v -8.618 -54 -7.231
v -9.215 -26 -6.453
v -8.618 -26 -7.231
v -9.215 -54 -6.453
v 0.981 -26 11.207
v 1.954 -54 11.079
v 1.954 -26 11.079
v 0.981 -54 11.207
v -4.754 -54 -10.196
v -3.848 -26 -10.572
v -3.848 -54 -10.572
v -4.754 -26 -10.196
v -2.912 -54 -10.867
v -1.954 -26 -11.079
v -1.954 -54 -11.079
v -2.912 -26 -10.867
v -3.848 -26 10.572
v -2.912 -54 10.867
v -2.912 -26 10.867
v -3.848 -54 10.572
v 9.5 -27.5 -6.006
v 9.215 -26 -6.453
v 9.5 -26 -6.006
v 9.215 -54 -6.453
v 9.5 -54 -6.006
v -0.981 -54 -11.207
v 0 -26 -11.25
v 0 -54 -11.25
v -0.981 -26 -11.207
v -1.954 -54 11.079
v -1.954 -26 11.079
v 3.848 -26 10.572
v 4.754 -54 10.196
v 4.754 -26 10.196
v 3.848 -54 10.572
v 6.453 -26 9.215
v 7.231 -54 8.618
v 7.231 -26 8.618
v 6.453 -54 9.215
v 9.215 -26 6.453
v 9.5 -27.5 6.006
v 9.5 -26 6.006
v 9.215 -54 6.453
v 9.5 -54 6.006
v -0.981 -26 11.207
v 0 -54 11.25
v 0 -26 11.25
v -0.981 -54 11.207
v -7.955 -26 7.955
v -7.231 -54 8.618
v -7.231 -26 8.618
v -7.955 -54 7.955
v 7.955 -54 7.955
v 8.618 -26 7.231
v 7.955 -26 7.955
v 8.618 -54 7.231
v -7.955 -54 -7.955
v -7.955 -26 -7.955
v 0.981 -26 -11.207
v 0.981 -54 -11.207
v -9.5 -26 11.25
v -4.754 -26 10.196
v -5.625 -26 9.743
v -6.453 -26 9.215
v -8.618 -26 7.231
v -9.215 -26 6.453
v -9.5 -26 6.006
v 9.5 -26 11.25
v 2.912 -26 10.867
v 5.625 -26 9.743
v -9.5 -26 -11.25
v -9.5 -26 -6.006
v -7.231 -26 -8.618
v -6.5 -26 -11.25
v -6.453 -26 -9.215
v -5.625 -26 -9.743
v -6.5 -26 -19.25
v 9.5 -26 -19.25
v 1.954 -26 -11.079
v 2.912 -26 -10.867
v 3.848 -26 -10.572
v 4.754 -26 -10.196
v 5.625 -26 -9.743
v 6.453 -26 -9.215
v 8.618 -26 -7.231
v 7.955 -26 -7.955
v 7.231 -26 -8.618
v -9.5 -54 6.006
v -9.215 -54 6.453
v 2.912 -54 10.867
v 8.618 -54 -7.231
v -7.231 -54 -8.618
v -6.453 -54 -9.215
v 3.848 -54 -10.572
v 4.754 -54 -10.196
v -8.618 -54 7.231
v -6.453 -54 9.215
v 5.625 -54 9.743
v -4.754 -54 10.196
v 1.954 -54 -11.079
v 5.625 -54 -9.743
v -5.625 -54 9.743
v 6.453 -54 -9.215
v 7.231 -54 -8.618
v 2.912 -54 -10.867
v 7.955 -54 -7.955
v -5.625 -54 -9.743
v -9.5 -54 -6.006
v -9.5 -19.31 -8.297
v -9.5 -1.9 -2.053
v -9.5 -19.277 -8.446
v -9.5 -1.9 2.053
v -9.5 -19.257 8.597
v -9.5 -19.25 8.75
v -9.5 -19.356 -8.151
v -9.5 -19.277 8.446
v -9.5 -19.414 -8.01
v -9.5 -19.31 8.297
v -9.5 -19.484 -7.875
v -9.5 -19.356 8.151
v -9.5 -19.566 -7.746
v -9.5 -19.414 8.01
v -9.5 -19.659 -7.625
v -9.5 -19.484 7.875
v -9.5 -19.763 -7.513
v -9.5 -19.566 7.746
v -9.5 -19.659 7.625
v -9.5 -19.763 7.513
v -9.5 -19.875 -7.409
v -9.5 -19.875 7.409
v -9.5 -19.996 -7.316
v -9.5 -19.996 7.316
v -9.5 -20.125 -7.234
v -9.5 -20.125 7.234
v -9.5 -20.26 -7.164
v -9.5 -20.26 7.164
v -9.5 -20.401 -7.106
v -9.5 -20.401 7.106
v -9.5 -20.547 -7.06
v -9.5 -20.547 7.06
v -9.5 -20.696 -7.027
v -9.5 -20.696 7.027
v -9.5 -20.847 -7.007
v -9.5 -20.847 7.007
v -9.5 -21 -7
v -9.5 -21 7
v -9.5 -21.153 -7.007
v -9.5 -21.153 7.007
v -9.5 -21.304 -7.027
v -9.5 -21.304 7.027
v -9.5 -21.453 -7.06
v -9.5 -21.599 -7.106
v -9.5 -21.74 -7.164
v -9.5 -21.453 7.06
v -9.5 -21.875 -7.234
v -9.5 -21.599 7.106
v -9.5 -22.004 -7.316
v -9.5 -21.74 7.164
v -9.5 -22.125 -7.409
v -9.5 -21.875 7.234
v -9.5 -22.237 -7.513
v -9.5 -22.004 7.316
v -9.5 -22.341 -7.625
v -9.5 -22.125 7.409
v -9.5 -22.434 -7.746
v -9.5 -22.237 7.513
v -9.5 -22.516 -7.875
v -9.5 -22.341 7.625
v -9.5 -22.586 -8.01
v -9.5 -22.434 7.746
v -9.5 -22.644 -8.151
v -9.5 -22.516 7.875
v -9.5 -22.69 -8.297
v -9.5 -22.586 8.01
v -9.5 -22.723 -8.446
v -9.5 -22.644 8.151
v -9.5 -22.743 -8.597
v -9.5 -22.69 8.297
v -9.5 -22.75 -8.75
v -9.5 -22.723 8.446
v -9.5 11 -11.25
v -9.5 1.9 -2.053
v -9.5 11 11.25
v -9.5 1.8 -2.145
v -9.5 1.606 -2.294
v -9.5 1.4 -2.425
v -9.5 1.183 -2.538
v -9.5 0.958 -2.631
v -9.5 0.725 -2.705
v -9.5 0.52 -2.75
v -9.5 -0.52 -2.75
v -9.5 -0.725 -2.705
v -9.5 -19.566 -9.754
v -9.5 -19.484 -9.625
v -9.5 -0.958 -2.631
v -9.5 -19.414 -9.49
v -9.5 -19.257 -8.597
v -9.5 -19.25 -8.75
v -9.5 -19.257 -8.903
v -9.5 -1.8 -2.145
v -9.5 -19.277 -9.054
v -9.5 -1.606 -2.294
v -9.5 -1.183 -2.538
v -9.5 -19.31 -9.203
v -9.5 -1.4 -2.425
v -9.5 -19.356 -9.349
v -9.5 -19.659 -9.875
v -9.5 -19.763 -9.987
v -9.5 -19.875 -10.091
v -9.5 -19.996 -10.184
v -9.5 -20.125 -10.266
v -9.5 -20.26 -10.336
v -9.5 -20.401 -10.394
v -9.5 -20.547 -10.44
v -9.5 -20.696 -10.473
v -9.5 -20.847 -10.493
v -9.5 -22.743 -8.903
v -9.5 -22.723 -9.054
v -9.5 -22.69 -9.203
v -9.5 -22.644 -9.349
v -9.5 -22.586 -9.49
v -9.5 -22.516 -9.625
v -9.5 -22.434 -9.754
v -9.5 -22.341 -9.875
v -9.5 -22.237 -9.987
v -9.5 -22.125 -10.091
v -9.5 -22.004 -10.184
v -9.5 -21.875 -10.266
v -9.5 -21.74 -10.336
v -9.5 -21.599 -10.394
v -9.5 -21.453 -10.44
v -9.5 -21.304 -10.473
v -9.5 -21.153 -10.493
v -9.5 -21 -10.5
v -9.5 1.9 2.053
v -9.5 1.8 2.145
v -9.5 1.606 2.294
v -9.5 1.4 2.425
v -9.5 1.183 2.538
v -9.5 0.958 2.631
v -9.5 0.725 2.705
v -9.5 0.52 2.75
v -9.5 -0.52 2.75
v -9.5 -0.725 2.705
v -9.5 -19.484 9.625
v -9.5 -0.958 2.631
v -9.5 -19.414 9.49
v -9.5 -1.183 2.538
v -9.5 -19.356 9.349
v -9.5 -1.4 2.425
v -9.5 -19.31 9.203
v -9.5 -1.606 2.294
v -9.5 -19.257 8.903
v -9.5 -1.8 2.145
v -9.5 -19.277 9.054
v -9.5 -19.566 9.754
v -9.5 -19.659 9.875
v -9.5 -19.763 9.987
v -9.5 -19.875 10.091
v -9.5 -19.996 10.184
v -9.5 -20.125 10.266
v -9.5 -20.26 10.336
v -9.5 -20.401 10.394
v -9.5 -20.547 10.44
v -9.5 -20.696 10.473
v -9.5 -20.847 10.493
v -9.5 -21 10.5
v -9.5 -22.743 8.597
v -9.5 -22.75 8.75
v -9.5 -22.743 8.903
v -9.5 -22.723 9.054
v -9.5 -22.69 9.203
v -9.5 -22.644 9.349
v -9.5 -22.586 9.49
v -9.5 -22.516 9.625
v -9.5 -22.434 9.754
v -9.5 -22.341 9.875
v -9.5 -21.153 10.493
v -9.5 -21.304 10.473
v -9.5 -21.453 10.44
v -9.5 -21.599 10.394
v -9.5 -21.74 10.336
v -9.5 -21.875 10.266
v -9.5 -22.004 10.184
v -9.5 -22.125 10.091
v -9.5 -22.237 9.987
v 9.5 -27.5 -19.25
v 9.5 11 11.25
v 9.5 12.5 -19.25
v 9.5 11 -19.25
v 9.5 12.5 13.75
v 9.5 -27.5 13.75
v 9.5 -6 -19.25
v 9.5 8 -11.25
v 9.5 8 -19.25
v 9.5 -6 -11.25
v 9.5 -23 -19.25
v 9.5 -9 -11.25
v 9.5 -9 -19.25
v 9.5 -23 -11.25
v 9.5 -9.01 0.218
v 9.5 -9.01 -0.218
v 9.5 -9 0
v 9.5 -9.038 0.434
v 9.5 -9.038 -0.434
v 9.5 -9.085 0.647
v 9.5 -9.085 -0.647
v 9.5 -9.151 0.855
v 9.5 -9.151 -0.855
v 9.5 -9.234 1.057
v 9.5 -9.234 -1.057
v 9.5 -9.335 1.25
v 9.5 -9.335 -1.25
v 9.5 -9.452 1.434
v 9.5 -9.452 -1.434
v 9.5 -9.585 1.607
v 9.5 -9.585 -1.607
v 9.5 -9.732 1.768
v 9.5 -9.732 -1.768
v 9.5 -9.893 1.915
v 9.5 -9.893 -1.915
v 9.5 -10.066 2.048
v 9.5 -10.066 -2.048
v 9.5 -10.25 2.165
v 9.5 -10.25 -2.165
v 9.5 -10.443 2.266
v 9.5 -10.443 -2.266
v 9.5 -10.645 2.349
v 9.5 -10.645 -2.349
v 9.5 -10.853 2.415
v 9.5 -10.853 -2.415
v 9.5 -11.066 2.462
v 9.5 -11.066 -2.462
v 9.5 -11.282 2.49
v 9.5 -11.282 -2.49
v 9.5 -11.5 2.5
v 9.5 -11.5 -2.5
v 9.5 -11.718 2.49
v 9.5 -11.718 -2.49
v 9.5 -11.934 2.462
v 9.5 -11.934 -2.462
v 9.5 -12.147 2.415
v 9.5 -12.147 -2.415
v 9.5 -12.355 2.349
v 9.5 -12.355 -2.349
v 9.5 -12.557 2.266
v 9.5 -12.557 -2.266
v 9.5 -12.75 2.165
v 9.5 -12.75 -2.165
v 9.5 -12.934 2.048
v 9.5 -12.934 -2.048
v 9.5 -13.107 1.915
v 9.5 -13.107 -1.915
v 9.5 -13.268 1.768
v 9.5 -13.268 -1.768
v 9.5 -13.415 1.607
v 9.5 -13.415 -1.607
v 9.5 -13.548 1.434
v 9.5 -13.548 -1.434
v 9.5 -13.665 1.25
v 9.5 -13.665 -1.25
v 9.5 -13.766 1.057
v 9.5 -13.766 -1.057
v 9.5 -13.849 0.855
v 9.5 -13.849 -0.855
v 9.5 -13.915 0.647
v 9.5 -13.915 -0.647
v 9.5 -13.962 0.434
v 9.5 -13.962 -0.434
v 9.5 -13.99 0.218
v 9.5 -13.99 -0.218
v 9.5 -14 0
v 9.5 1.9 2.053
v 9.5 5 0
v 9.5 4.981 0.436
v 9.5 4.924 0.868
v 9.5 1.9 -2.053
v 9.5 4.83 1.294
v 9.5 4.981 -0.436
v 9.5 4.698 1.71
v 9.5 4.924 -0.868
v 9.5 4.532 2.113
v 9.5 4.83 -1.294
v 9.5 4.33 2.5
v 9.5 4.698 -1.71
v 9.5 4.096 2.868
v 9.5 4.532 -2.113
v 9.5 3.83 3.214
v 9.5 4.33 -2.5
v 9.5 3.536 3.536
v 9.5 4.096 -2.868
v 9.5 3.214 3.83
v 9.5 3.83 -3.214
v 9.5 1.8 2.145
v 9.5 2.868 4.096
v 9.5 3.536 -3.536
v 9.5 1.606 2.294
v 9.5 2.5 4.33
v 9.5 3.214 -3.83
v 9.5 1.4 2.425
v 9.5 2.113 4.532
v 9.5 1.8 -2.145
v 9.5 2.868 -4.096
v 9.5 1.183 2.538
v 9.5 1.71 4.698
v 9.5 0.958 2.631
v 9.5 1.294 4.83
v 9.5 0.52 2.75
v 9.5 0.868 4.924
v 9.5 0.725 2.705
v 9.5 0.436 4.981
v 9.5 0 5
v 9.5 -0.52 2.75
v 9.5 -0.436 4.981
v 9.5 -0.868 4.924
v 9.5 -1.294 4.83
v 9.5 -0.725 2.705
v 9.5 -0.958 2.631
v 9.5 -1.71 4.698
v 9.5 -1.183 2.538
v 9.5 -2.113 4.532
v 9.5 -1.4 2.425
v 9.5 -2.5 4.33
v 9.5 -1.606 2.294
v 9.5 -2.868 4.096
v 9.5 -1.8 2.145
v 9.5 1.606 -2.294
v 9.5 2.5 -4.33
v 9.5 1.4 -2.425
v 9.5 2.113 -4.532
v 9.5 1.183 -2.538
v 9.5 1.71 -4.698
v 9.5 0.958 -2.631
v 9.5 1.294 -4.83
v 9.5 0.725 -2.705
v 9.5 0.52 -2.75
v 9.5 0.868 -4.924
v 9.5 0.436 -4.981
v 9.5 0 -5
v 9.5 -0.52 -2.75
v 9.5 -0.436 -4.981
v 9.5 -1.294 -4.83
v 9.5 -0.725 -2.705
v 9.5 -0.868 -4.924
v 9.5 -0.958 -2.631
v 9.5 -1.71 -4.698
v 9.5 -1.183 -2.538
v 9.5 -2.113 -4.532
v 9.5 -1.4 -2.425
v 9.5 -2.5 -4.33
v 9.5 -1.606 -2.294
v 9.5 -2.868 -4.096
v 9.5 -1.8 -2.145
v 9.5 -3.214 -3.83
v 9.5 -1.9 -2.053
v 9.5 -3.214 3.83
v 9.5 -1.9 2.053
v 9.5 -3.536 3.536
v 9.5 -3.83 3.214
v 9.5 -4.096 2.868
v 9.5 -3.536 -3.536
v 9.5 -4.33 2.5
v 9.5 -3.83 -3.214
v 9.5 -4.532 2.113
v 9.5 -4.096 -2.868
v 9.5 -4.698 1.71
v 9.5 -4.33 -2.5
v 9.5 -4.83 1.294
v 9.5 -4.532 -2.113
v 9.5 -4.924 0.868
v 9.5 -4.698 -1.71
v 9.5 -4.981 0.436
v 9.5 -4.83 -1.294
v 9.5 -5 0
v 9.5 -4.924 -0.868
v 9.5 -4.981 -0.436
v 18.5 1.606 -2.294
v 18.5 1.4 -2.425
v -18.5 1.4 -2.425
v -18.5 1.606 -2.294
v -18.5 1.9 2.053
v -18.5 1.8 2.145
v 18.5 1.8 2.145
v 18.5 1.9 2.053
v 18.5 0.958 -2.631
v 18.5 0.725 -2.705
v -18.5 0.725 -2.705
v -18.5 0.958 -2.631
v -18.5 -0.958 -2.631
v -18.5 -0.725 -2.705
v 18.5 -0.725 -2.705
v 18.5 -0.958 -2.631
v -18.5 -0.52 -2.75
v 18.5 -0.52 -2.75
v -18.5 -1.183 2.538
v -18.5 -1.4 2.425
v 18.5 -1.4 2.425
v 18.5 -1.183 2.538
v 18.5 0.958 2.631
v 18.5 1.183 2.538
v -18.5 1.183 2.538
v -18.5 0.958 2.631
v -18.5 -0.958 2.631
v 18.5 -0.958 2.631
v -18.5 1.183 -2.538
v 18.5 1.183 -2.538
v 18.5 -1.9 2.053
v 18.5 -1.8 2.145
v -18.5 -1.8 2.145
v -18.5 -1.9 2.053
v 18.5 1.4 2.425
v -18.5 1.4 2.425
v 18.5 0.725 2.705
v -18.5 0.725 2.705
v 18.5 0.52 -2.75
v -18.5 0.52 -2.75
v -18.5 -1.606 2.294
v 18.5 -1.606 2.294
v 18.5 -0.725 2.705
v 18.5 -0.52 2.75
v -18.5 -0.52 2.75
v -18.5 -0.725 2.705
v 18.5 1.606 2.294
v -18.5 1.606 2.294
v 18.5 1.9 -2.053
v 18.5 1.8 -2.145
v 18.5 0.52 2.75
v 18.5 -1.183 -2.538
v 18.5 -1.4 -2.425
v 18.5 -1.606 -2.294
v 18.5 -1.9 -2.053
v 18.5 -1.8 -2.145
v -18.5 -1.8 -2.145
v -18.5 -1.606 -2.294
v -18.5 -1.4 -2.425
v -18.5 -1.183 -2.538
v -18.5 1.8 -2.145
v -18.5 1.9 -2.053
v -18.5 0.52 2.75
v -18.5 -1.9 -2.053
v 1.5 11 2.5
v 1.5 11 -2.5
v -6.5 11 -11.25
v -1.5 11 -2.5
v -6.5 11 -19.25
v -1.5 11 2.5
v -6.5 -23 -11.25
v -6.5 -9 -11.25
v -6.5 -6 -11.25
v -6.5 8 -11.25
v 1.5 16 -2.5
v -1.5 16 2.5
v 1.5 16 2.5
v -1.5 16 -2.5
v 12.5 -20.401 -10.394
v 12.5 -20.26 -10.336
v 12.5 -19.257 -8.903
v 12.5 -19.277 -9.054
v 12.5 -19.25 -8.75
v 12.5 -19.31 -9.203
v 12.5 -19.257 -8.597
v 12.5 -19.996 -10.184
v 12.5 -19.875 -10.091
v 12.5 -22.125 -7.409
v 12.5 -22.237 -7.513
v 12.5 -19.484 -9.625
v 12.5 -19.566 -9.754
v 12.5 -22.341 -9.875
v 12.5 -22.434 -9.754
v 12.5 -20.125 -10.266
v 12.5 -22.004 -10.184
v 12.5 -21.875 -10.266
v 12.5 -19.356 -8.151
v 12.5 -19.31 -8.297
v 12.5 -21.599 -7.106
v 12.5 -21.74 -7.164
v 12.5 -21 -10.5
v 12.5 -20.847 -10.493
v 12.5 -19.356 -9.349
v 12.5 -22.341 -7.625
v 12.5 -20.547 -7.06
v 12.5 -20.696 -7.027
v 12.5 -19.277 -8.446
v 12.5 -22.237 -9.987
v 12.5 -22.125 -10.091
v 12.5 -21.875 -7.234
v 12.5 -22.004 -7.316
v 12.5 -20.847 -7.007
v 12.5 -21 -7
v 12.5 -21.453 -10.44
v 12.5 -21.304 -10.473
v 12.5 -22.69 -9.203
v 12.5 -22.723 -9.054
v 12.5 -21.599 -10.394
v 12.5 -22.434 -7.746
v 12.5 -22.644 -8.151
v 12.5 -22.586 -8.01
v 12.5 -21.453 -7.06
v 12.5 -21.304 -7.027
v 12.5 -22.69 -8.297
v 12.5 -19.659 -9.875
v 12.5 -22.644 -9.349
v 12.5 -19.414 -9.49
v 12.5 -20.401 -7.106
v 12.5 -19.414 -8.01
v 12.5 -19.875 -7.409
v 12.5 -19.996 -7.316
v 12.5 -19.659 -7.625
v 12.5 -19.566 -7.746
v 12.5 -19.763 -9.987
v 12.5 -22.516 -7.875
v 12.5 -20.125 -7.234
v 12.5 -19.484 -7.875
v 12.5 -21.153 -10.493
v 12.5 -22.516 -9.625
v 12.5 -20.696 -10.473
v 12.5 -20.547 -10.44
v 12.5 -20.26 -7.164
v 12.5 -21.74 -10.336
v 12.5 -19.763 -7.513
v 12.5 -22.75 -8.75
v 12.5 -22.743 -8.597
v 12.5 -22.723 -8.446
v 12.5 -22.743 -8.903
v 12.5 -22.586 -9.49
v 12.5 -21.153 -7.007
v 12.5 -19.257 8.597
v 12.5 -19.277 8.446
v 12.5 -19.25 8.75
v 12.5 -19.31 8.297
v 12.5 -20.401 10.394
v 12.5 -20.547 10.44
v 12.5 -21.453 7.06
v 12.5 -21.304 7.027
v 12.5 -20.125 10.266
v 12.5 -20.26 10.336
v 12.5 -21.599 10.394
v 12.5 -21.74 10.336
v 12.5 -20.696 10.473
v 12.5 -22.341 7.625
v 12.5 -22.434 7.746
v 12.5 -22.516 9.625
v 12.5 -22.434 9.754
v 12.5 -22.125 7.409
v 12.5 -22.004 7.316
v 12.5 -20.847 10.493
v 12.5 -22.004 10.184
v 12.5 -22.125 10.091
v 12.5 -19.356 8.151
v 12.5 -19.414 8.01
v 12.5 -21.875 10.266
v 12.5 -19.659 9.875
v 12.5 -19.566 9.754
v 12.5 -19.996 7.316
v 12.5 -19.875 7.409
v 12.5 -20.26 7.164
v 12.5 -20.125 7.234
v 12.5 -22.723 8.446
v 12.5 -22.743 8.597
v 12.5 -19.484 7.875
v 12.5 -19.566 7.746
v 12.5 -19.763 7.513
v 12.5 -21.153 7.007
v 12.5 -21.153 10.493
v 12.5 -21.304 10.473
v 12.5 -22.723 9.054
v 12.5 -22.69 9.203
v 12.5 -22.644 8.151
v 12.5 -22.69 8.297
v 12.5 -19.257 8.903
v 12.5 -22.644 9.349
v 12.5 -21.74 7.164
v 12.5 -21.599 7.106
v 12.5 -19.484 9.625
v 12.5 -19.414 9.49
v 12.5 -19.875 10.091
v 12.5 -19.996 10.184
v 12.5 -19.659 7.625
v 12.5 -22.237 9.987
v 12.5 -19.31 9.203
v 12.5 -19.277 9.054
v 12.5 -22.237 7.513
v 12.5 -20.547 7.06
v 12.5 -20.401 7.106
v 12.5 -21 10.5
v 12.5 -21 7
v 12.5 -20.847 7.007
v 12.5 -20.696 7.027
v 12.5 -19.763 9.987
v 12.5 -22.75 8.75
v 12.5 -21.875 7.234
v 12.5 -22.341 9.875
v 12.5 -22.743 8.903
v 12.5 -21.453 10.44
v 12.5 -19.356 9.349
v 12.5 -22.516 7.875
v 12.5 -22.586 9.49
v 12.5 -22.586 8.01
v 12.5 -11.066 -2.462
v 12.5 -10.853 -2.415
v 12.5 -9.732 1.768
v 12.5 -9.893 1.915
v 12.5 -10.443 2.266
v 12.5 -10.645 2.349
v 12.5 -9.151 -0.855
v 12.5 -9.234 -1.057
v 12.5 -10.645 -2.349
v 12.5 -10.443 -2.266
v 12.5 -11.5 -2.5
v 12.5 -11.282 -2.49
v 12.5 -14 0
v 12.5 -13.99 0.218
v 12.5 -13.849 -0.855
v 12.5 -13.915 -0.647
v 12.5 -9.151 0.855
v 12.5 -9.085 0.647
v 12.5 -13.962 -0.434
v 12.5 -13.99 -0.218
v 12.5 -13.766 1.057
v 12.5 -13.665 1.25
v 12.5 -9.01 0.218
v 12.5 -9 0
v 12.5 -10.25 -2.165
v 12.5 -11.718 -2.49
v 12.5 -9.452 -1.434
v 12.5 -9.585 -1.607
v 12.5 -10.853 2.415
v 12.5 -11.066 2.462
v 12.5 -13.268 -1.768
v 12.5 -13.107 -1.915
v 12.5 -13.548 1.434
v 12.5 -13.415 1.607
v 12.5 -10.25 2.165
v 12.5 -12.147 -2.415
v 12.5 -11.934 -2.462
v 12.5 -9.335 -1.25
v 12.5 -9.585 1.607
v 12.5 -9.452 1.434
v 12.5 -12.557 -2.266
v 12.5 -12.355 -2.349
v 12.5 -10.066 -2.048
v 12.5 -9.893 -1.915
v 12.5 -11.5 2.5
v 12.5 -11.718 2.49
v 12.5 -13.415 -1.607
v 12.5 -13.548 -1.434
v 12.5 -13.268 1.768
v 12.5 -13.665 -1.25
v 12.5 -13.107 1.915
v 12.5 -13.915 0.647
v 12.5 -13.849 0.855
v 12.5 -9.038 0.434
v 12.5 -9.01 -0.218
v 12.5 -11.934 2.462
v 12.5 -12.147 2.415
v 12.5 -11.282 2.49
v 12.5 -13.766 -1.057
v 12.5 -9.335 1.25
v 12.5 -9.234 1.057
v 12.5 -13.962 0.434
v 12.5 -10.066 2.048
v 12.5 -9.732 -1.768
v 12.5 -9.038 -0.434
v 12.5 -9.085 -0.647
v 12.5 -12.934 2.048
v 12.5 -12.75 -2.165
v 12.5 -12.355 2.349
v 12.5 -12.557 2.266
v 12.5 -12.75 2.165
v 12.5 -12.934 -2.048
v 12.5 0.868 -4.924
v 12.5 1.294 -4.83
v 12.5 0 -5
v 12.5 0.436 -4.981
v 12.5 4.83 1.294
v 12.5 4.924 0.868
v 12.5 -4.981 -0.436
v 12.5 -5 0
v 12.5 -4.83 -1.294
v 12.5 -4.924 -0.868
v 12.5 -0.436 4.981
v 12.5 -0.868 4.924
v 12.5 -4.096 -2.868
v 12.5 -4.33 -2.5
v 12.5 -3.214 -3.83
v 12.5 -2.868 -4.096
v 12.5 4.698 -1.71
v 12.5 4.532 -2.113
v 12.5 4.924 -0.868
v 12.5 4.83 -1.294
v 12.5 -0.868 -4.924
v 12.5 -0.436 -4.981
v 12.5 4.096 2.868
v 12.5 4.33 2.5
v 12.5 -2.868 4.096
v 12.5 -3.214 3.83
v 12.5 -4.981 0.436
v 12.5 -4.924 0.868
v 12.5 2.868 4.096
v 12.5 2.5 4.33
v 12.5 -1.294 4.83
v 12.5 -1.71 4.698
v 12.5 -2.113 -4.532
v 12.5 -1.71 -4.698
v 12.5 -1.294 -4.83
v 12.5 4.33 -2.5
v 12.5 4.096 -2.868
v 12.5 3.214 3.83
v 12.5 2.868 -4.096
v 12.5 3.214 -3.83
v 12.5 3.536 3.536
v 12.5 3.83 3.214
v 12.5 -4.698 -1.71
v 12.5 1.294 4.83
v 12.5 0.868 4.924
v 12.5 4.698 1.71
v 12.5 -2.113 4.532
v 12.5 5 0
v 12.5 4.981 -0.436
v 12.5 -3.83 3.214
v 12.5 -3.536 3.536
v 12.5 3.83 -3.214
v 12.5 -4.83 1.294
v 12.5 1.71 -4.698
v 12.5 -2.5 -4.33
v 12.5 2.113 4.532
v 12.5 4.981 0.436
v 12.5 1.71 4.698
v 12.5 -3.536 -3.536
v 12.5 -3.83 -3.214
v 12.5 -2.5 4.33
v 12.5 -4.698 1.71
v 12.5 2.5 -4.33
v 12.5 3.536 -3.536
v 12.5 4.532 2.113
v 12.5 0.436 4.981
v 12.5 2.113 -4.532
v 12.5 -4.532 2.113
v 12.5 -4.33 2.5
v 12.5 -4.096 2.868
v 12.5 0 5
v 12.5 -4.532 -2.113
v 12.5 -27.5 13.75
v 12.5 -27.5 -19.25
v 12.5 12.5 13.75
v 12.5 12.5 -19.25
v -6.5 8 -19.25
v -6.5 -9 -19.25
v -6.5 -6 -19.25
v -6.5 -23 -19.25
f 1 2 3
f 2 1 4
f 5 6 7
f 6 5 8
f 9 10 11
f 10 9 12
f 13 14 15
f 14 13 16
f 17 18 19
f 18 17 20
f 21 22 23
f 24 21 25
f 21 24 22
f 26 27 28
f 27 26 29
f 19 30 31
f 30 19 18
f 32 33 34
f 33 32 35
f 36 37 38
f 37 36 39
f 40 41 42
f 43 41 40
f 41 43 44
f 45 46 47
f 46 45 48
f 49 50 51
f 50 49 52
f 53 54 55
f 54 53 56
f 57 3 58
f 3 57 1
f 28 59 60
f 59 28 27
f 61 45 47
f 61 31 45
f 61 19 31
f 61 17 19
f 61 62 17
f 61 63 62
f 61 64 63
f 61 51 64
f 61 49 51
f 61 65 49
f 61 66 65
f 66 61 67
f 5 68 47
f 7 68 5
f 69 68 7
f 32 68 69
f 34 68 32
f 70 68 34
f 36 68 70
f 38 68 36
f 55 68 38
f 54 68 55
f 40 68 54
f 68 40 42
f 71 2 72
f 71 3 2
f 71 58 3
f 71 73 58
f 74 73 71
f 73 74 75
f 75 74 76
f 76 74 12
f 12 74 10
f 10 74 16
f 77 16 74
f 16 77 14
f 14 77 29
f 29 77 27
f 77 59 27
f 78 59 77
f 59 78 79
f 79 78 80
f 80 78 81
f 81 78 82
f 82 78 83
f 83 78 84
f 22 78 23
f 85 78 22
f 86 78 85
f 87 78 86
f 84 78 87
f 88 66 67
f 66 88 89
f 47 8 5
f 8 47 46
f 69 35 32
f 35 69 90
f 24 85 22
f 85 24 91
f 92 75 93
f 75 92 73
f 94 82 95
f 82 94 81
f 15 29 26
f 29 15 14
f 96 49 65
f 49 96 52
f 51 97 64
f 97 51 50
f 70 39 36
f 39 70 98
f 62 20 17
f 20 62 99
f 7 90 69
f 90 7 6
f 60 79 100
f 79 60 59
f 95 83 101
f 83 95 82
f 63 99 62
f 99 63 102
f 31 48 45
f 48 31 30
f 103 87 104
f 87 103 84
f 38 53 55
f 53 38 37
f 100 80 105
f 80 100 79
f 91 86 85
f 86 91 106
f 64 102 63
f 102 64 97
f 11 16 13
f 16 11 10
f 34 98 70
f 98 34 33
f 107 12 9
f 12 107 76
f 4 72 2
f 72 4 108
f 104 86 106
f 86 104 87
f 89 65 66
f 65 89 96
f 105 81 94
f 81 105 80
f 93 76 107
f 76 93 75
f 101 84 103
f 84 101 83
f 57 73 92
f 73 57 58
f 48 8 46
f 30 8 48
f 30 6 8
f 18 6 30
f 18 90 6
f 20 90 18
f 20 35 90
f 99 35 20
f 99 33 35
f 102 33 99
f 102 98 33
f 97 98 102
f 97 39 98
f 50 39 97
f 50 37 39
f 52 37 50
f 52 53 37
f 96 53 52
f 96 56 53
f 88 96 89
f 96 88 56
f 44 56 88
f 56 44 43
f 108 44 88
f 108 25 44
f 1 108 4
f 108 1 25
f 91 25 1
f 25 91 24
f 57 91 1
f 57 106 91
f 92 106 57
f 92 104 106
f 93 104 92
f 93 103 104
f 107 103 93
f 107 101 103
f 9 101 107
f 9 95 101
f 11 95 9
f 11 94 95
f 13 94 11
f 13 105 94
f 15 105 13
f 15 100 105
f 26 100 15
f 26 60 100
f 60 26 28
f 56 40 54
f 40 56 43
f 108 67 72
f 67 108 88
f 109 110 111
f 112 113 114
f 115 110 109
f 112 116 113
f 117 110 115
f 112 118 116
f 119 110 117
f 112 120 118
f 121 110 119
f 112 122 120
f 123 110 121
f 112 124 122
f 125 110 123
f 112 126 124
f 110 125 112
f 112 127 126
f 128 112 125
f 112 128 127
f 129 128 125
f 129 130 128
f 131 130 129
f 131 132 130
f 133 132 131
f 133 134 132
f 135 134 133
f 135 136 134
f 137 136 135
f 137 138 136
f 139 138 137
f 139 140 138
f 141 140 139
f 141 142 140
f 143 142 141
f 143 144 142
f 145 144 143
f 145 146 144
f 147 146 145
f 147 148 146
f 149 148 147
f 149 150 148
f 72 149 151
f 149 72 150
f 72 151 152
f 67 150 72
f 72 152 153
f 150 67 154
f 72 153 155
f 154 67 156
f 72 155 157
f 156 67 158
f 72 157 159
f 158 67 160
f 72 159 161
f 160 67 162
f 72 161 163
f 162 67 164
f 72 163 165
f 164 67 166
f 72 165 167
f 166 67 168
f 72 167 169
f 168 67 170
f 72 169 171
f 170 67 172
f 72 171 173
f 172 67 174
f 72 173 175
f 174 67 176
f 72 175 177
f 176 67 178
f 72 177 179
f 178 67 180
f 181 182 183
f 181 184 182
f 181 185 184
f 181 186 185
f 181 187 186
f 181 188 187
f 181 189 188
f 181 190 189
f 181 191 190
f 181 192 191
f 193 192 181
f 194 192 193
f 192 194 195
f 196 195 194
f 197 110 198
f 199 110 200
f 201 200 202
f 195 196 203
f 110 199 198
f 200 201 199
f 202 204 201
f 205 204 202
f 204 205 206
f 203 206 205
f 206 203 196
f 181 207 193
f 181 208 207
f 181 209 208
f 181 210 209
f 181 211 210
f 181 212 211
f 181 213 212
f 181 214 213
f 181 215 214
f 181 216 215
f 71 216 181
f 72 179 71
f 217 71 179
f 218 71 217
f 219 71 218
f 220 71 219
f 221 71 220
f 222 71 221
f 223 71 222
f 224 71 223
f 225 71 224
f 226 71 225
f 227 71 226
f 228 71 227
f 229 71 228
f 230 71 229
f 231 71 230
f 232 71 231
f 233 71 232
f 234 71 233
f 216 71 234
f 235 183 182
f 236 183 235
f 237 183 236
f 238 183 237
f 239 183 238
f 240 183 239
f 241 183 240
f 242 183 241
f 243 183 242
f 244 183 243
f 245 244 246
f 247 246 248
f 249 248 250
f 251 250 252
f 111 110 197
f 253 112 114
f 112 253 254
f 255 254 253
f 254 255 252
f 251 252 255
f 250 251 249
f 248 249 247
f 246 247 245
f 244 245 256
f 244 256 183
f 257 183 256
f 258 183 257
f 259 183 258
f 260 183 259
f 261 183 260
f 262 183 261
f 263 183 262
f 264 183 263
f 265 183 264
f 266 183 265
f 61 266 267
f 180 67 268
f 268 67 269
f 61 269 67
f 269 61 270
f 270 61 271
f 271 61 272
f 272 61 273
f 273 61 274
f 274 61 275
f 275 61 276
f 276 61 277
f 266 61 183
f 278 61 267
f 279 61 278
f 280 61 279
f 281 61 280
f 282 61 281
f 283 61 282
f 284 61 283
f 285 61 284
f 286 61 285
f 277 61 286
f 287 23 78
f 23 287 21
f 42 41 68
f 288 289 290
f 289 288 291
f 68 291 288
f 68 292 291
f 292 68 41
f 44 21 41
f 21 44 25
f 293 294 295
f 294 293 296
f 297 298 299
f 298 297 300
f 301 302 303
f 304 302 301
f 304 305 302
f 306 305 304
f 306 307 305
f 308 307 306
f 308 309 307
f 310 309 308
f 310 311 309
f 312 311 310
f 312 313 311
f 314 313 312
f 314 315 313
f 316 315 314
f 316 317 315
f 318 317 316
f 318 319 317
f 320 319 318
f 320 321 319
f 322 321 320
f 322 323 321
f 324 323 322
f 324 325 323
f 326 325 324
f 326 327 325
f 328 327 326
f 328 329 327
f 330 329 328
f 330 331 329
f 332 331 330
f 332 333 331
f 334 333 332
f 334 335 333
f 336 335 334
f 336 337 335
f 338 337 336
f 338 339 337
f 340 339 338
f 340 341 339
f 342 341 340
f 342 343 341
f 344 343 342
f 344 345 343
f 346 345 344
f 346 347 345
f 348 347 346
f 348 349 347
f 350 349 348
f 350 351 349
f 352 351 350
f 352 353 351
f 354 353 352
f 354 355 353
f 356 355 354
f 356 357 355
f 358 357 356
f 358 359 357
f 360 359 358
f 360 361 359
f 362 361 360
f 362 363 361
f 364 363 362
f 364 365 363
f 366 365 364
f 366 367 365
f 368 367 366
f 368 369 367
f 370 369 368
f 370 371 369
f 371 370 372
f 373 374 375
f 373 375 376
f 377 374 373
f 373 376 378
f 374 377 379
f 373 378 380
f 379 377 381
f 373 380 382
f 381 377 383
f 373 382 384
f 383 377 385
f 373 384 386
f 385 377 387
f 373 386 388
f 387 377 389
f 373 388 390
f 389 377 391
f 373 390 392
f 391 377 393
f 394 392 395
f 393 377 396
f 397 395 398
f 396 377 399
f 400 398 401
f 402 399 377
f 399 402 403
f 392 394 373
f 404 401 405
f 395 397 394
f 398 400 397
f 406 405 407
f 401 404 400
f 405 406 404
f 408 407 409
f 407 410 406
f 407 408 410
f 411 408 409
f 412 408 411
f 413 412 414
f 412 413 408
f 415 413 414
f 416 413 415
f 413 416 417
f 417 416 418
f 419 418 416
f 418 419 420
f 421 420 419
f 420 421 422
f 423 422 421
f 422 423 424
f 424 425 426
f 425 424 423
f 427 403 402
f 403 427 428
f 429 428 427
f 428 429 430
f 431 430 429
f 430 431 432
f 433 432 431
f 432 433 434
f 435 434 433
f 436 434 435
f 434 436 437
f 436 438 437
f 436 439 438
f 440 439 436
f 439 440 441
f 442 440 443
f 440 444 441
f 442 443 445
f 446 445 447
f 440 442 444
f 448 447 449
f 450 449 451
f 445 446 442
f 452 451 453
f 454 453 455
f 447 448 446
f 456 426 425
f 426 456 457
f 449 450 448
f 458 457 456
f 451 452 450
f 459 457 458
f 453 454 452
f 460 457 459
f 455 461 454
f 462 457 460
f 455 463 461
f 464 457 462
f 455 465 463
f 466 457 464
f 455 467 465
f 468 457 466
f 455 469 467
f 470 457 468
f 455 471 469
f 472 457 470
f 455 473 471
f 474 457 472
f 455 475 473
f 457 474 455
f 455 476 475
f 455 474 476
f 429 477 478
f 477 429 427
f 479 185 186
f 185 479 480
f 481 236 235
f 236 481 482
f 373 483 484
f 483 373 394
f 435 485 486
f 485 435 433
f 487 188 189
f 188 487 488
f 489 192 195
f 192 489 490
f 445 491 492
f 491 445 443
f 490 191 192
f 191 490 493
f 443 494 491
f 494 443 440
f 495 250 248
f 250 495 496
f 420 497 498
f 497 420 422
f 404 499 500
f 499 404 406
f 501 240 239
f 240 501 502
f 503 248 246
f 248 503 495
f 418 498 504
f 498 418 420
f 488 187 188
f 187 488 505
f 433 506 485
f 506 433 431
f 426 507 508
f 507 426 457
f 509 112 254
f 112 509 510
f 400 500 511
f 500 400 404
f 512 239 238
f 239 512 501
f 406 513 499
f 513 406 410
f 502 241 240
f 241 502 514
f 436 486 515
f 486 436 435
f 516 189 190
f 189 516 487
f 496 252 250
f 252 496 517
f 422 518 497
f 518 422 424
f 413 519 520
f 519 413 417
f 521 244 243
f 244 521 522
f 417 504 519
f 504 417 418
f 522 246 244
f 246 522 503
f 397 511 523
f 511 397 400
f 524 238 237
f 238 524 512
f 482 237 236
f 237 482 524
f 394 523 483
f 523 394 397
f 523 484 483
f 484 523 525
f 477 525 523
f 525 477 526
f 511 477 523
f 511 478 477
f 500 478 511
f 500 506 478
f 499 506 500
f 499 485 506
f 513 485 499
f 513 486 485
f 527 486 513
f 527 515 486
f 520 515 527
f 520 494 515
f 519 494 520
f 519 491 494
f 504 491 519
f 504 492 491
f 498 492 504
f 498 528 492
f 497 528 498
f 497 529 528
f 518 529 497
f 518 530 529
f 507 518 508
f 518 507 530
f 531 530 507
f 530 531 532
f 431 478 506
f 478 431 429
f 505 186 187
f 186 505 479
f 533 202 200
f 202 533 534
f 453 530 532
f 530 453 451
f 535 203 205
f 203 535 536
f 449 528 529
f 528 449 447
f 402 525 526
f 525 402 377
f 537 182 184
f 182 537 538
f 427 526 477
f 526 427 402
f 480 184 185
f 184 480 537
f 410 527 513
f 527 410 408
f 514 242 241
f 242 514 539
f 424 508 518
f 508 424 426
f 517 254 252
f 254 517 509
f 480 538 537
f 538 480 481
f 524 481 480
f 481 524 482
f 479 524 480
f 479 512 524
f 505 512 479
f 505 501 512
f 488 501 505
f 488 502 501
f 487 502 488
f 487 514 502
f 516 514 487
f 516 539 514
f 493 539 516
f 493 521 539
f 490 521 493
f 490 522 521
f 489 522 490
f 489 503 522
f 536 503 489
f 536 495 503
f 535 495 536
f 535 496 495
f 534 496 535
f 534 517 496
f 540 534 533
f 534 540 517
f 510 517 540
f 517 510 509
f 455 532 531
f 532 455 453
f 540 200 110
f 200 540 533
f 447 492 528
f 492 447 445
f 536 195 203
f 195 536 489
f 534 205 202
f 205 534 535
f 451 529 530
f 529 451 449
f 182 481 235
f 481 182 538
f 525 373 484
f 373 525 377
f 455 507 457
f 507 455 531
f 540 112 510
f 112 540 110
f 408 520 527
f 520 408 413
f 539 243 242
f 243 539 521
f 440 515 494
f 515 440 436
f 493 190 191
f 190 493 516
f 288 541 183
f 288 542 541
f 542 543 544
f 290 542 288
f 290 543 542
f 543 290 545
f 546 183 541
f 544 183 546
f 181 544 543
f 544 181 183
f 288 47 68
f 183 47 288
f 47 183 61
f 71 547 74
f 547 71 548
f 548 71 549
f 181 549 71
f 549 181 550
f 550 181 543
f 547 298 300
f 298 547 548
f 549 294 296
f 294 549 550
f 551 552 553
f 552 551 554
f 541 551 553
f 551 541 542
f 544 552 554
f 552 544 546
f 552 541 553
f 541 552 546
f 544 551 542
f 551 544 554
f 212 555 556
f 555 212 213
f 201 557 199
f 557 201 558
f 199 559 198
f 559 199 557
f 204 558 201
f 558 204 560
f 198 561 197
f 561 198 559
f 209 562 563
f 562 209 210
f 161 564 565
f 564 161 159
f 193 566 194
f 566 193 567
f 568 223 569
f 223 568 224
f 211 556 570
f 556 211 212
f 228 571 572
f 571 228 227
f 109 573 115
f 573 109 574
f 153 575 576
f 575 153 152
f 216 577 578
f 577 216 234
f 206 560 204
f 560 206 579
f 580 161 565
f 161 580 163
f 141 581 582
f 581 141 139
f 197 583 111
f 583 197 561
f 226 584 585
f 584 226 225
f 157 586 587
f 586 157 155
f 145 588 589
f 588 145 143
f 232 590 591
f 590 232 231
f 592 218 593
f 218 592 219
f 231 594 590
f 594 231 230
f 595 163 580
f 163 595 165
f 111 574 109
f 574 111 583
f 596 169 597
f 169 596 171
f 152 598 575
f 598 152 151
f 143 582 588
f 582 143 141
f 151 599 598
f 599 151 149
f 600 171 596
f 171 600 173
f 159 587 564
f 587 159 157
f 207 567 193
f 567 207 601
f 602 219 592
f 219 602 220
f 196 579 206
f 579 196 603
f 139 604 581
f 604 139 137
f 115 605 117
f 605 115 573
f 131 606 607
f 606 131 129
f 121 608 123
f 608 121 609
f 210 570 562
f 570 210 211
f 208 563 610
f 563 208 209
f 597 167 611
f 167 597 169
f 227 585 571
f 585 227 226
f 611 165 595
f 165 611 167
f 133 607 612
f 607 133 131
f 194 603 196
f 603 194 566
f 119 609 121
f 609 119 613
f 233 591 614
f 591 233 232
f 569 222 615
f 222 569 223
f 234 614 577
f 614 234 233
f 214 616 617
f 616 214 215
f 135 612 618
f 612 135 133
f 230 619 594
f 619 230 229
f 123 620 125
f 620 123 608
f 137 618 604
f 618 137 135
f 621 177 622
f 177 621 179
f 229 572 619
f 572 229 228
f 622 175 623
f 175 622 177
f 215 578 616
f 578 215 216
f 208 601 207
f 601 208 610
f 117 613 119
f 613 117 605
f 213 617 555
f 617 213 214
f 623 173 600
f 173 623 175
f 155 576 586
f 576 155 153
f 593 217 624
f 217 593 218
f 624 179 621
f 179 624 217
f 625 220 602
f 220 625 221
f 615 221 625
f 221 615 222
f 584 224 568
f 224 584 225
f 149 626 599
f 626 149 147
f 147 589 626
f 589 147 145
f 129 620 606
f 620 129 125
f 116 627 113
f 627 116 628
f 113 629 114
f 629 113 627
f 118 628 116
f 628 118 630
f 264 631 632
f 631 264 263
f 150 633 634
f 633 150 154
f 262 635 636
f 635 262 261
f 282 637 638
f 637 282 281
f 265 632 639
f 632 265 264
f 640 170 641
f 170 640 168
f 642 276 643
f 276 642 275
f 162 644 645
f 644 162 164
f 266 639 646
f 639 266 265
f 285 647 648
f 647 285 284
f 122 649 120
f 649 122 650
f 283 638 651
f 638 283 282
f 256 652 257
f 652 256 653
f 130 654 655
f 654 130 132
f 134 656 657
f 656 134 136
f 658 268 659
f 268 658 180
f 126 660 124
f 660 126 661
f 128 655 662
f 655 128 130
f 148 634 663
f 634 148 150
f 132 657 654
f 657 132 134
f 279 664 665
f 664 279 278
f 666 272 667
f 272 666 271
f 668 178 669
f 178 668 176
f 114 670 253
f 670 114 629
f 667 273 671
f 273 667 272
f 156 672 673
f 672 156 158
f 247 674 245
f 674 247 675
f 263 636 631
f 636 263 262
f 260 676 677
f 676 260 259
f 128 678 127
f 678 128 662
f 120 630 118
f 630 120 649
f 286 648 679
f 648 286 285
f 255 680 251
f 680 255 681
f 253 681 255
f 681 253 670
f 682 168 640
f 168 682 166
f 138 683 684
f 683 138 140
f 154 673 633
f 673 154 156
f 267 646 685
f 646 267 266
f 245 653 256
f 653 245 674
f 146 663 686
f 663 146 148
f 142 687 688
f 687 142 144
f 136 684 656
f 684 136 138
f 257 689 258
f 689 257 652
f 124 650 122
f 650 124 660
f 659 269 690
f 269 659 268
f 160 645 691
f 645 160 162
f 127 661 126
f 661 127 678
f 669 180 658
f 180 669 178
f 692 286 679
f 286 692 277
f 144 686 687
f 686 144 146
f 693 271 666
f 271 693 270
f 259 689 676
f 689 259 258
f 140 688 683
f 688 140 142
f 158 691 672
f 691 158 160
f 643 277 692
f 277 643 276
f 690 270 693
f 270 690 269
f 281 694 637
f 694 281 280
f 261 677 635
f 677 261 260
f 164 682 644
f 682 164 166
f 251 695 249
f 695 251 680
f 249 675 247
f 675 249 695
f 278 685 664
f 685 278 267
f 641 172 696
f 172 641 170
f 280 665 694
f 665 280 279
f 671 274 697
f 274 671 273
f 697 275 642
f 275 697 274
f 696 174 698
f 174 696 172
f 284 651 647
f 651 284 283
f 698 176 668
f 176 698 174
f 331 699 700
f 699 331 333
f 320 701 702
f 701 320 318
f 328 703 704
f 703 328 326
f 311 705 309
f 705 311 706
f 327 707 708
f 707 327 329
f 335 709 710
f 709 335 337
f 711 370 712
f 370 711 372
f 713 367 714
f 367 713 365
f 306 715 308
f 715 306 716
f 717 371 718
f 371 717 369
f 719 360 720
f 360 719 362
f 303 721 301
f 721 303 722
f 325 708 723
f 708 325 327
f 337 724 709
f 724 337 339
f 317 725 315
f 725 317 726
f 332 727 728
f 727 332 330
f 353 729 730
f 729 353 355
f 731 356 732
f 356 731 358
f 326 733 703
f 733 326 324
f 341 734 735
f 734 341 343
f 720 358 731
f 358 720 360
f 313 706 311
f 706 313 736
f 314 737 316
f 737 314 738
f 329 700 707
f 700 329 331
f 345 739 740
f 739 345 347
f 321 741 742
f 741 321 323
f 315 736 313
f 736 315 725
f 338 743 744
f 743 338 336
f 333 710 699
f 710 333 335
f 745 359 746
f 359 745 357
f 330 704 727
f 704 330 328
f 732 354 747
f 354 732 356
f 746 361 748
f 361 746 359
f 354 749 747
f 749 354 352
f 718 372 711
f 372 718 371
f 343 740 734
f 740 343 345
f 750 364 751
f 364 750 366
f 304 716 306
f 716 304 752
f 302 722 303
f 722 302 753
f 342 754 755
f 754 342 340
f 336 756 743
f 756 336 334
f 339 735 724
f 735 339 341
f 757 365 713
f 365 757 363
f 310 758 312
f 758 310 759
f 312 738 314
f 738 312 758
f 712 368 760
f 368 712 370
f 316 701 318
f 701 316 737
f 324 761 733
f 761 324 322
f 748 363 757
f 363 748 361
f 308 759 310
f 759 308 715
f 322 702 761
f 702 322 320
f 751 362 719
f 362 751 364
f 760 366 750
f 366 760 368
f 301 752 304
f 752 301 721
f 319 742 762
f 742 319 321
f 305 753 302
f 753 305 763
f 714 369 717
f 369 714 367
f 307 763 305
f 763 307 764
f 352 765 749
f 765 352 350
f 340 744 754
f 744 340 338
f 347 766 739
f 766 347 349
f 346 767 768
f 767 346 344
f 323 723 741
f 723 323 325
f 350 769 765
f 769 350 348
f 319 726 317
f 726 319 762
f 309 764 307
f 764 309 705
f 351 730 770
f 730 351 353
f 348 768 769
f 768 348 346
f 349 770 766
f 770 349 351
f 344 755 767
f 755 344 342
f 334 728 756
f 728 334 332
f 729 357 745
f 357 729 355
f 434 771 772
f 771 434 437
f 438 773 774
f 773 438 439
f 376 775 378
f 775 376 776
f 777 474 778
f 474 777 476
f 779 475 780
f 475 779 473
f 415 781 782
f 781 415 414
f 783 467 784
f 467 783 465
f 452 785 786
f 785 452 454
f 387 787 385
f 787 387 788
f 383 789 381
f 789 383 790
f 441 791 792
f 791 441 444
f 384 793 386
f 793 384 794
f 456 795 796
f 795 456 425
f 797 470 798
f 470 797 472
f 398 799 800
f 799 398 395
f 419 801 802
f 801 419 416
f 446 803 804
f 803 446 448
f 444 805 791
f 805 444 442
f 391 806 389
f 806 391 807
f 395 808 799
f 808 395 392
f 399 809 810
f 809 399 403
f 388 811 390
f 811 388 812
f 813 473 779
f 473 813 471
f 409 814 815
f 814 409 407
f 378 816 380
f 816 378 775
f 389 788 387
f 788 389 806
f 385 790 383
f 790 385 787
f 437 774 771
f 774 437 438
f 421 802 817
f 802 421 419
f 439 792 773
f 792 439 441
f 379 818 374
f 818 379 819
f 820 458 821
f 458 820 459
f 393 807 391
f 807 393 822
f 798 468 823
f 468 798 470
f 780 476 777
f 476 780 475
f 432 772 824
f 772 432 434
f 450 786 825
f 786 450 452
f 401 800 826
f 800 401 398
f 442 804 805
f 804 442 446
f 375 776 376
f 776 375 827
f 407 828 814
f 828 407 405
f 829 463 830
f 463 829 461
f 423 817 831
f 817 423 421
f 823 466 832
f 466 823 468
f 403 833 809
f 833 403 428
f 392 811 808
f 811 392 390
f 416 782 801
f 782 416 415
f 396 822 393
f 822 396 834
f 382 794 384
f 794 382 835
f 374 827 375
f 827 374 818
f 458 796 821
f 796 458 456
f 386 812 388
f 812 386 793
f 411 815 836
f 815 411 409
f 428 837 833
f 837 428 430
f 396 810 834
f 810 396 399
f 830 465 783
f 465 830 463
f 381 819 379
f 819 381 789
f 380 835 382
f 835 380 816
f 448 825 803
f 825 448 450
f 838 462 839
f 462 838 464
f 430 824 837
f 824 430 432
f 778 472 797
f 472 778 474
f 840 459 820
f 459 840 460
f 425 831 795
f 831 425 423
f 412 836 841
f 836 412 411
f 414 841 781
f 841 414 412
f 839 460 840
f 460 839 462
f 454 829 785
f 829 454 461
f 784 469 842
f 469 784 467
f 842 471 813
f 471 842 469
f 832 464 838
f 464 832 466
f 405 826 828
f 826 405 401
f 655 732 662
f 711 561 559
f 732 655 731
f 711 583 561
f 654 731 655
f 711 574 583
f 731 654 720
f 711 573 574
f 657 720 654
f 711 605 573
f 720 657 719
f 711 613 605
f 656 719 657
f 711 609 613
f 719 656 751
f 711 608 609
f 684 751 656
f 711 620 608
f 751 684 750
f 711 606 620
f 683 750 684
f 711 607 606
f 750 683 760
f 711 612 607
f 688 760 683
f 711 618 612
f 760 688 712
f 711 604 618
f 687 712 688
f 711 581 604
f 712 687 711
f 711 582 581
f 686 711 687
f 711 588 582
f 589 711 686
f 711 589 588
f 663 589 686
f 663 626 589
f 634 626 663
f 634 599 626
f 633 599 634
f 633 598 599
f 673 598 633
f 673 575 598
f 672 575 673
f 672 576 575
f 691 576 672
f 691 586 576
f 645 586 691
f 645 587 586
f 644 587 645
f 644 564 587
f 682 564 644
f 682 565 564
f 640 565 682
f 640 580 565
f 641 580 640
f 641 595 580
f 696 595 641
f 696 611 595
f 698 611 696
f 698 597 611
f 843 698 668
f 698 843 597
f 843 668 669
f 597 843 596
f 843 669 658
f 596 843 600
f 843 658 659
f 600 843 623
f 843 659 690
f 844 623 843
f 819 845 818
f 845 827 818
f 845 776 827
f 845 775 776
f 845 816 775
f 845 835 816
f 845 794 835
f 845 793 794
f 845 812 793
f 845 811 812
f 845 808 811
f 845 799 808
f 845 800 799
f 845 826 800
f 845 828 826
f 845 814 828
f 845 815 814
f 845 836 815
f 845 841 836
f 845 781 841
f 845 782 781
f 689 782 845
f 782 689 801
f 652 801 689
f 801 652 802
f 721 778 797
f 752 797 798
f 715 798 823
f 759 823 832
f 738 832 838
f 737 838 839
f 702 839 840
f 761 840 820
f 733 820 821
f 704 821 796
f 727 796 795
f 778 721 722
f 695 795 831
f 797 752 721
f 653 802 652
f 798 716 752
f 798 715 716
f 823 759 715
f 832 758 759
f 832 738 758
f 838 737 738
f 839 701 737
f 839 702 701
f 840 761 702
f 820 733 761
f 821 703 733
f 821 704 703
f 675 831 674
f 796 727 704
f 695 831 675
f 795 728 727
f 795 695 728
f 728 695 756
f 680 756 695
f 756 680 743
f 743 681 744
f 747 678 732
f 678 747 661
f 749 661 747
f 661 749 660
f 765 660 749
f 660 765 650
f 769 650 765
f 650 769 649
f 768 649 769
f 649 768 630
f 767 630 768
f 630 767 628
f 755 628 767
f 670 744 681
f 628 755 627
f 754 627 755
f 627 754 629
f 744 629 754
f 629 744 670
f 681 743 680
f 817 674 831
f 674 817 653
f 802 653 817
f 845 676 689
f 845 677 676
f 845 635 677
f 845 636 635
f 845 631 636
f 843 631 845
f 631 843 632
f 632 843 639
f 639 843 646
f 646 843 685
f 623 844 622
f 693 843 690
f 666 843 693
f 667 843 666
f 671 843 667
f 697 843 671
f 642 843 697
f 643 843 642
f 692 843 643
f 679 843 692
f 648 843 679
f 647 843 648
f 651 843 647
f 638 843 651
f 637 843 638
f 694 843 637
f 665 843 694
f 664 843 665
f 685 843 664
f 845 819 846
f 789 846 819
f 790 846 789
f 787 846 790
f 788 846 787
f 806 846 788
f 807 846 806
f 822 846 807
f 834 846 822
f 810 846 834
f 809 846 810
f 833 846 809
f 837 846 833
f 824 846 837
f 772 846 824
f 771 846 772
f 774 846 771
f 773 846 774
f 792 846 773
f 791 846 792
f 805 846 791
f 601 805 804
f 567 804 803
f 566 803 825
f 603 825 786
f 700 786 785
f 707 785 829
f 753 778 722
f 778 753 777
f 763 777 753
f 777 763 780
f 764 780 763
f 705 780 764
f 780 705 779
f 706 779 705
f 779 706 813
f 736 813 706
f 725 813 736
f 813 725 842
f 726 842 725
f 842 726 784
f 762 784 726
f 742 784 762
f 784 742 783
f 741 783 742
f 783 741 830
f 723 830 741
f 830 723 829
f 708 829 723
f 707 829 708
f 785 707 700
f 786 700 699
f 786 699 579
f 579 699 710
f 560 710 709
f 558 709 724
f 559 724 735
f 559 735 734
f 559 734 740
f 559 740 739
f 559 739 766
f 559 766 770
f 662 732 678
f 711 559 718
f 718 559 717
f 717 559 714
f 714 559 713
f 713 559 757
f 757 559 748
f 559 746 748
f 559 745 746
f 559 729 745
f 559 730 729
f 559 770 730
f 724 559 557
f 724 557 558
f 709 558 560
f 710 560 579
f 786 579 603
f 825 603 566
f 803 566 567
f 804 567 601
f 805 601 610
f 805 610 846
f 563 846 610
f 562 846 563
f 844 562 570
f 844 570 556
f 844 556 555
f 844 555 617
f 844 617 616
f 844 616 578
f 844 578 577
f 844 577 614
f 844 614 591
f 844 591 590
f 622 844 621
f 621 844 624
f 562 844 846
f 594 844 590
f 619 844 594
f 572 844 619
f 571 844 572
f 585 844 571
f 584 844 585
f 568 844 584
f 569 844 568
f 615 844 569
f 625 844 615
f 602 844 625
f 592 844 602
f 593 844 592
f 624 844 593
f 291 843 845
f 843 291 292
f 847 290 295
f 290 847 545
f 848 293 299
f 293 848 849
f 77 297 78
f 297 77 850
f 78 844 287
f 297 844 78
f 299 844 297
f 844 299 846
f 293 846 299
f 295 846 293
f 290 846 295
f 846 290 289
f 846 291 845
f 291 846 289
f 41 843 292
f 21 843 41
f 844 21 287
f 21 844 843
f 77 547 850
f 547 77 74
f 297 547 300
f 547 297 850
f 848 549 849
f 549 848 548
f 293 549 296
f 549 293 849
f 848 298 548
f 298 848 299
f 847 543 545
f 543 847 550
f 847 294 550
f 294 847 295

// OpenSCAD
$fn = 72;

motor();

translate([11,0,0])
motor_mount();

//translate([-11,0,0])
//motor_mount();

module motor()
{
    translate([0,-7.5,0])
    rotate([90,0,90])
    difference()
    {
        union()
        {
            color("yellow")
            cube([37, 22.5, 19], center=true);
            
            color("yellow")
            translate([18.5 + 2.5,0,0])
            cube([5, 5, 3], center=true);
            
            color("grey")
            translate([-(18.5 + 14), 0, ])
            rotate([0,90,0])
            intersection()
            {
                cylinder(d=22.5, h=28, center=true);
                cube([19,22.5, 28], center=true);
            }
            
            color("white")
            translate([18.5 - 11,0,0])
            shaft();
        }
        
        rotate([0,90,-90])
        mounting_holes();
    }
}

module shaft(keyed=true)
{
    intersection()
    {
        cylinder(d=5.6, h=37, center=true);
        
        if (keyed)
        {
            cube([3.8, 5.5, 37], center=true);
        }
    }
}

module mounting_holes()
{
    rotate([90,0,90])
    union()
    {
        translate([-(18.5 - 5), 17.5/2, 0])
        cylinder(d=3.5, h=19*2, center=true);
        
        translate([-(18.5 - 5), -17.5/2, 0])
        cylinder(d=3.5, h=19*2, center=true);
    }
}

module motor_mount(thickness=3, supports=true)
{
    mount_height = 8;
    
    translate([0,-7.5,0])
    
    union()
    {
        // Mounting for the motor
        difference()
        {
            translate([0,0,1.25 - mount_height/2])
            cube([thickness, 40, mount_height + 22.5 + 2.5], center=true);
            
            union()
            {
                mounting_holes();
                
                // Mounting nub
                translate([0, 18.5 - 11 - 11.5, 0])
                rotate([0,90,0])
                cylinder(d=5, h=37, center=true);
                
                // Motor Shaft
                translate([0, 18.5 - 11,0])
                rotate([0,90,0])
                cylinder(d=10, h=37, center=true);
            }
        }
        
        // Support for the motor
        if (supports)
        {
            union()
            {
                for (y_offset = [-17, 0, 17])
                {
                    translate([-9.5, y_offset, -(mount_height/2 + 22.5/2)])
                    cube([16,3,mount_height], center=true);
                }
            }
        }
    }
}
